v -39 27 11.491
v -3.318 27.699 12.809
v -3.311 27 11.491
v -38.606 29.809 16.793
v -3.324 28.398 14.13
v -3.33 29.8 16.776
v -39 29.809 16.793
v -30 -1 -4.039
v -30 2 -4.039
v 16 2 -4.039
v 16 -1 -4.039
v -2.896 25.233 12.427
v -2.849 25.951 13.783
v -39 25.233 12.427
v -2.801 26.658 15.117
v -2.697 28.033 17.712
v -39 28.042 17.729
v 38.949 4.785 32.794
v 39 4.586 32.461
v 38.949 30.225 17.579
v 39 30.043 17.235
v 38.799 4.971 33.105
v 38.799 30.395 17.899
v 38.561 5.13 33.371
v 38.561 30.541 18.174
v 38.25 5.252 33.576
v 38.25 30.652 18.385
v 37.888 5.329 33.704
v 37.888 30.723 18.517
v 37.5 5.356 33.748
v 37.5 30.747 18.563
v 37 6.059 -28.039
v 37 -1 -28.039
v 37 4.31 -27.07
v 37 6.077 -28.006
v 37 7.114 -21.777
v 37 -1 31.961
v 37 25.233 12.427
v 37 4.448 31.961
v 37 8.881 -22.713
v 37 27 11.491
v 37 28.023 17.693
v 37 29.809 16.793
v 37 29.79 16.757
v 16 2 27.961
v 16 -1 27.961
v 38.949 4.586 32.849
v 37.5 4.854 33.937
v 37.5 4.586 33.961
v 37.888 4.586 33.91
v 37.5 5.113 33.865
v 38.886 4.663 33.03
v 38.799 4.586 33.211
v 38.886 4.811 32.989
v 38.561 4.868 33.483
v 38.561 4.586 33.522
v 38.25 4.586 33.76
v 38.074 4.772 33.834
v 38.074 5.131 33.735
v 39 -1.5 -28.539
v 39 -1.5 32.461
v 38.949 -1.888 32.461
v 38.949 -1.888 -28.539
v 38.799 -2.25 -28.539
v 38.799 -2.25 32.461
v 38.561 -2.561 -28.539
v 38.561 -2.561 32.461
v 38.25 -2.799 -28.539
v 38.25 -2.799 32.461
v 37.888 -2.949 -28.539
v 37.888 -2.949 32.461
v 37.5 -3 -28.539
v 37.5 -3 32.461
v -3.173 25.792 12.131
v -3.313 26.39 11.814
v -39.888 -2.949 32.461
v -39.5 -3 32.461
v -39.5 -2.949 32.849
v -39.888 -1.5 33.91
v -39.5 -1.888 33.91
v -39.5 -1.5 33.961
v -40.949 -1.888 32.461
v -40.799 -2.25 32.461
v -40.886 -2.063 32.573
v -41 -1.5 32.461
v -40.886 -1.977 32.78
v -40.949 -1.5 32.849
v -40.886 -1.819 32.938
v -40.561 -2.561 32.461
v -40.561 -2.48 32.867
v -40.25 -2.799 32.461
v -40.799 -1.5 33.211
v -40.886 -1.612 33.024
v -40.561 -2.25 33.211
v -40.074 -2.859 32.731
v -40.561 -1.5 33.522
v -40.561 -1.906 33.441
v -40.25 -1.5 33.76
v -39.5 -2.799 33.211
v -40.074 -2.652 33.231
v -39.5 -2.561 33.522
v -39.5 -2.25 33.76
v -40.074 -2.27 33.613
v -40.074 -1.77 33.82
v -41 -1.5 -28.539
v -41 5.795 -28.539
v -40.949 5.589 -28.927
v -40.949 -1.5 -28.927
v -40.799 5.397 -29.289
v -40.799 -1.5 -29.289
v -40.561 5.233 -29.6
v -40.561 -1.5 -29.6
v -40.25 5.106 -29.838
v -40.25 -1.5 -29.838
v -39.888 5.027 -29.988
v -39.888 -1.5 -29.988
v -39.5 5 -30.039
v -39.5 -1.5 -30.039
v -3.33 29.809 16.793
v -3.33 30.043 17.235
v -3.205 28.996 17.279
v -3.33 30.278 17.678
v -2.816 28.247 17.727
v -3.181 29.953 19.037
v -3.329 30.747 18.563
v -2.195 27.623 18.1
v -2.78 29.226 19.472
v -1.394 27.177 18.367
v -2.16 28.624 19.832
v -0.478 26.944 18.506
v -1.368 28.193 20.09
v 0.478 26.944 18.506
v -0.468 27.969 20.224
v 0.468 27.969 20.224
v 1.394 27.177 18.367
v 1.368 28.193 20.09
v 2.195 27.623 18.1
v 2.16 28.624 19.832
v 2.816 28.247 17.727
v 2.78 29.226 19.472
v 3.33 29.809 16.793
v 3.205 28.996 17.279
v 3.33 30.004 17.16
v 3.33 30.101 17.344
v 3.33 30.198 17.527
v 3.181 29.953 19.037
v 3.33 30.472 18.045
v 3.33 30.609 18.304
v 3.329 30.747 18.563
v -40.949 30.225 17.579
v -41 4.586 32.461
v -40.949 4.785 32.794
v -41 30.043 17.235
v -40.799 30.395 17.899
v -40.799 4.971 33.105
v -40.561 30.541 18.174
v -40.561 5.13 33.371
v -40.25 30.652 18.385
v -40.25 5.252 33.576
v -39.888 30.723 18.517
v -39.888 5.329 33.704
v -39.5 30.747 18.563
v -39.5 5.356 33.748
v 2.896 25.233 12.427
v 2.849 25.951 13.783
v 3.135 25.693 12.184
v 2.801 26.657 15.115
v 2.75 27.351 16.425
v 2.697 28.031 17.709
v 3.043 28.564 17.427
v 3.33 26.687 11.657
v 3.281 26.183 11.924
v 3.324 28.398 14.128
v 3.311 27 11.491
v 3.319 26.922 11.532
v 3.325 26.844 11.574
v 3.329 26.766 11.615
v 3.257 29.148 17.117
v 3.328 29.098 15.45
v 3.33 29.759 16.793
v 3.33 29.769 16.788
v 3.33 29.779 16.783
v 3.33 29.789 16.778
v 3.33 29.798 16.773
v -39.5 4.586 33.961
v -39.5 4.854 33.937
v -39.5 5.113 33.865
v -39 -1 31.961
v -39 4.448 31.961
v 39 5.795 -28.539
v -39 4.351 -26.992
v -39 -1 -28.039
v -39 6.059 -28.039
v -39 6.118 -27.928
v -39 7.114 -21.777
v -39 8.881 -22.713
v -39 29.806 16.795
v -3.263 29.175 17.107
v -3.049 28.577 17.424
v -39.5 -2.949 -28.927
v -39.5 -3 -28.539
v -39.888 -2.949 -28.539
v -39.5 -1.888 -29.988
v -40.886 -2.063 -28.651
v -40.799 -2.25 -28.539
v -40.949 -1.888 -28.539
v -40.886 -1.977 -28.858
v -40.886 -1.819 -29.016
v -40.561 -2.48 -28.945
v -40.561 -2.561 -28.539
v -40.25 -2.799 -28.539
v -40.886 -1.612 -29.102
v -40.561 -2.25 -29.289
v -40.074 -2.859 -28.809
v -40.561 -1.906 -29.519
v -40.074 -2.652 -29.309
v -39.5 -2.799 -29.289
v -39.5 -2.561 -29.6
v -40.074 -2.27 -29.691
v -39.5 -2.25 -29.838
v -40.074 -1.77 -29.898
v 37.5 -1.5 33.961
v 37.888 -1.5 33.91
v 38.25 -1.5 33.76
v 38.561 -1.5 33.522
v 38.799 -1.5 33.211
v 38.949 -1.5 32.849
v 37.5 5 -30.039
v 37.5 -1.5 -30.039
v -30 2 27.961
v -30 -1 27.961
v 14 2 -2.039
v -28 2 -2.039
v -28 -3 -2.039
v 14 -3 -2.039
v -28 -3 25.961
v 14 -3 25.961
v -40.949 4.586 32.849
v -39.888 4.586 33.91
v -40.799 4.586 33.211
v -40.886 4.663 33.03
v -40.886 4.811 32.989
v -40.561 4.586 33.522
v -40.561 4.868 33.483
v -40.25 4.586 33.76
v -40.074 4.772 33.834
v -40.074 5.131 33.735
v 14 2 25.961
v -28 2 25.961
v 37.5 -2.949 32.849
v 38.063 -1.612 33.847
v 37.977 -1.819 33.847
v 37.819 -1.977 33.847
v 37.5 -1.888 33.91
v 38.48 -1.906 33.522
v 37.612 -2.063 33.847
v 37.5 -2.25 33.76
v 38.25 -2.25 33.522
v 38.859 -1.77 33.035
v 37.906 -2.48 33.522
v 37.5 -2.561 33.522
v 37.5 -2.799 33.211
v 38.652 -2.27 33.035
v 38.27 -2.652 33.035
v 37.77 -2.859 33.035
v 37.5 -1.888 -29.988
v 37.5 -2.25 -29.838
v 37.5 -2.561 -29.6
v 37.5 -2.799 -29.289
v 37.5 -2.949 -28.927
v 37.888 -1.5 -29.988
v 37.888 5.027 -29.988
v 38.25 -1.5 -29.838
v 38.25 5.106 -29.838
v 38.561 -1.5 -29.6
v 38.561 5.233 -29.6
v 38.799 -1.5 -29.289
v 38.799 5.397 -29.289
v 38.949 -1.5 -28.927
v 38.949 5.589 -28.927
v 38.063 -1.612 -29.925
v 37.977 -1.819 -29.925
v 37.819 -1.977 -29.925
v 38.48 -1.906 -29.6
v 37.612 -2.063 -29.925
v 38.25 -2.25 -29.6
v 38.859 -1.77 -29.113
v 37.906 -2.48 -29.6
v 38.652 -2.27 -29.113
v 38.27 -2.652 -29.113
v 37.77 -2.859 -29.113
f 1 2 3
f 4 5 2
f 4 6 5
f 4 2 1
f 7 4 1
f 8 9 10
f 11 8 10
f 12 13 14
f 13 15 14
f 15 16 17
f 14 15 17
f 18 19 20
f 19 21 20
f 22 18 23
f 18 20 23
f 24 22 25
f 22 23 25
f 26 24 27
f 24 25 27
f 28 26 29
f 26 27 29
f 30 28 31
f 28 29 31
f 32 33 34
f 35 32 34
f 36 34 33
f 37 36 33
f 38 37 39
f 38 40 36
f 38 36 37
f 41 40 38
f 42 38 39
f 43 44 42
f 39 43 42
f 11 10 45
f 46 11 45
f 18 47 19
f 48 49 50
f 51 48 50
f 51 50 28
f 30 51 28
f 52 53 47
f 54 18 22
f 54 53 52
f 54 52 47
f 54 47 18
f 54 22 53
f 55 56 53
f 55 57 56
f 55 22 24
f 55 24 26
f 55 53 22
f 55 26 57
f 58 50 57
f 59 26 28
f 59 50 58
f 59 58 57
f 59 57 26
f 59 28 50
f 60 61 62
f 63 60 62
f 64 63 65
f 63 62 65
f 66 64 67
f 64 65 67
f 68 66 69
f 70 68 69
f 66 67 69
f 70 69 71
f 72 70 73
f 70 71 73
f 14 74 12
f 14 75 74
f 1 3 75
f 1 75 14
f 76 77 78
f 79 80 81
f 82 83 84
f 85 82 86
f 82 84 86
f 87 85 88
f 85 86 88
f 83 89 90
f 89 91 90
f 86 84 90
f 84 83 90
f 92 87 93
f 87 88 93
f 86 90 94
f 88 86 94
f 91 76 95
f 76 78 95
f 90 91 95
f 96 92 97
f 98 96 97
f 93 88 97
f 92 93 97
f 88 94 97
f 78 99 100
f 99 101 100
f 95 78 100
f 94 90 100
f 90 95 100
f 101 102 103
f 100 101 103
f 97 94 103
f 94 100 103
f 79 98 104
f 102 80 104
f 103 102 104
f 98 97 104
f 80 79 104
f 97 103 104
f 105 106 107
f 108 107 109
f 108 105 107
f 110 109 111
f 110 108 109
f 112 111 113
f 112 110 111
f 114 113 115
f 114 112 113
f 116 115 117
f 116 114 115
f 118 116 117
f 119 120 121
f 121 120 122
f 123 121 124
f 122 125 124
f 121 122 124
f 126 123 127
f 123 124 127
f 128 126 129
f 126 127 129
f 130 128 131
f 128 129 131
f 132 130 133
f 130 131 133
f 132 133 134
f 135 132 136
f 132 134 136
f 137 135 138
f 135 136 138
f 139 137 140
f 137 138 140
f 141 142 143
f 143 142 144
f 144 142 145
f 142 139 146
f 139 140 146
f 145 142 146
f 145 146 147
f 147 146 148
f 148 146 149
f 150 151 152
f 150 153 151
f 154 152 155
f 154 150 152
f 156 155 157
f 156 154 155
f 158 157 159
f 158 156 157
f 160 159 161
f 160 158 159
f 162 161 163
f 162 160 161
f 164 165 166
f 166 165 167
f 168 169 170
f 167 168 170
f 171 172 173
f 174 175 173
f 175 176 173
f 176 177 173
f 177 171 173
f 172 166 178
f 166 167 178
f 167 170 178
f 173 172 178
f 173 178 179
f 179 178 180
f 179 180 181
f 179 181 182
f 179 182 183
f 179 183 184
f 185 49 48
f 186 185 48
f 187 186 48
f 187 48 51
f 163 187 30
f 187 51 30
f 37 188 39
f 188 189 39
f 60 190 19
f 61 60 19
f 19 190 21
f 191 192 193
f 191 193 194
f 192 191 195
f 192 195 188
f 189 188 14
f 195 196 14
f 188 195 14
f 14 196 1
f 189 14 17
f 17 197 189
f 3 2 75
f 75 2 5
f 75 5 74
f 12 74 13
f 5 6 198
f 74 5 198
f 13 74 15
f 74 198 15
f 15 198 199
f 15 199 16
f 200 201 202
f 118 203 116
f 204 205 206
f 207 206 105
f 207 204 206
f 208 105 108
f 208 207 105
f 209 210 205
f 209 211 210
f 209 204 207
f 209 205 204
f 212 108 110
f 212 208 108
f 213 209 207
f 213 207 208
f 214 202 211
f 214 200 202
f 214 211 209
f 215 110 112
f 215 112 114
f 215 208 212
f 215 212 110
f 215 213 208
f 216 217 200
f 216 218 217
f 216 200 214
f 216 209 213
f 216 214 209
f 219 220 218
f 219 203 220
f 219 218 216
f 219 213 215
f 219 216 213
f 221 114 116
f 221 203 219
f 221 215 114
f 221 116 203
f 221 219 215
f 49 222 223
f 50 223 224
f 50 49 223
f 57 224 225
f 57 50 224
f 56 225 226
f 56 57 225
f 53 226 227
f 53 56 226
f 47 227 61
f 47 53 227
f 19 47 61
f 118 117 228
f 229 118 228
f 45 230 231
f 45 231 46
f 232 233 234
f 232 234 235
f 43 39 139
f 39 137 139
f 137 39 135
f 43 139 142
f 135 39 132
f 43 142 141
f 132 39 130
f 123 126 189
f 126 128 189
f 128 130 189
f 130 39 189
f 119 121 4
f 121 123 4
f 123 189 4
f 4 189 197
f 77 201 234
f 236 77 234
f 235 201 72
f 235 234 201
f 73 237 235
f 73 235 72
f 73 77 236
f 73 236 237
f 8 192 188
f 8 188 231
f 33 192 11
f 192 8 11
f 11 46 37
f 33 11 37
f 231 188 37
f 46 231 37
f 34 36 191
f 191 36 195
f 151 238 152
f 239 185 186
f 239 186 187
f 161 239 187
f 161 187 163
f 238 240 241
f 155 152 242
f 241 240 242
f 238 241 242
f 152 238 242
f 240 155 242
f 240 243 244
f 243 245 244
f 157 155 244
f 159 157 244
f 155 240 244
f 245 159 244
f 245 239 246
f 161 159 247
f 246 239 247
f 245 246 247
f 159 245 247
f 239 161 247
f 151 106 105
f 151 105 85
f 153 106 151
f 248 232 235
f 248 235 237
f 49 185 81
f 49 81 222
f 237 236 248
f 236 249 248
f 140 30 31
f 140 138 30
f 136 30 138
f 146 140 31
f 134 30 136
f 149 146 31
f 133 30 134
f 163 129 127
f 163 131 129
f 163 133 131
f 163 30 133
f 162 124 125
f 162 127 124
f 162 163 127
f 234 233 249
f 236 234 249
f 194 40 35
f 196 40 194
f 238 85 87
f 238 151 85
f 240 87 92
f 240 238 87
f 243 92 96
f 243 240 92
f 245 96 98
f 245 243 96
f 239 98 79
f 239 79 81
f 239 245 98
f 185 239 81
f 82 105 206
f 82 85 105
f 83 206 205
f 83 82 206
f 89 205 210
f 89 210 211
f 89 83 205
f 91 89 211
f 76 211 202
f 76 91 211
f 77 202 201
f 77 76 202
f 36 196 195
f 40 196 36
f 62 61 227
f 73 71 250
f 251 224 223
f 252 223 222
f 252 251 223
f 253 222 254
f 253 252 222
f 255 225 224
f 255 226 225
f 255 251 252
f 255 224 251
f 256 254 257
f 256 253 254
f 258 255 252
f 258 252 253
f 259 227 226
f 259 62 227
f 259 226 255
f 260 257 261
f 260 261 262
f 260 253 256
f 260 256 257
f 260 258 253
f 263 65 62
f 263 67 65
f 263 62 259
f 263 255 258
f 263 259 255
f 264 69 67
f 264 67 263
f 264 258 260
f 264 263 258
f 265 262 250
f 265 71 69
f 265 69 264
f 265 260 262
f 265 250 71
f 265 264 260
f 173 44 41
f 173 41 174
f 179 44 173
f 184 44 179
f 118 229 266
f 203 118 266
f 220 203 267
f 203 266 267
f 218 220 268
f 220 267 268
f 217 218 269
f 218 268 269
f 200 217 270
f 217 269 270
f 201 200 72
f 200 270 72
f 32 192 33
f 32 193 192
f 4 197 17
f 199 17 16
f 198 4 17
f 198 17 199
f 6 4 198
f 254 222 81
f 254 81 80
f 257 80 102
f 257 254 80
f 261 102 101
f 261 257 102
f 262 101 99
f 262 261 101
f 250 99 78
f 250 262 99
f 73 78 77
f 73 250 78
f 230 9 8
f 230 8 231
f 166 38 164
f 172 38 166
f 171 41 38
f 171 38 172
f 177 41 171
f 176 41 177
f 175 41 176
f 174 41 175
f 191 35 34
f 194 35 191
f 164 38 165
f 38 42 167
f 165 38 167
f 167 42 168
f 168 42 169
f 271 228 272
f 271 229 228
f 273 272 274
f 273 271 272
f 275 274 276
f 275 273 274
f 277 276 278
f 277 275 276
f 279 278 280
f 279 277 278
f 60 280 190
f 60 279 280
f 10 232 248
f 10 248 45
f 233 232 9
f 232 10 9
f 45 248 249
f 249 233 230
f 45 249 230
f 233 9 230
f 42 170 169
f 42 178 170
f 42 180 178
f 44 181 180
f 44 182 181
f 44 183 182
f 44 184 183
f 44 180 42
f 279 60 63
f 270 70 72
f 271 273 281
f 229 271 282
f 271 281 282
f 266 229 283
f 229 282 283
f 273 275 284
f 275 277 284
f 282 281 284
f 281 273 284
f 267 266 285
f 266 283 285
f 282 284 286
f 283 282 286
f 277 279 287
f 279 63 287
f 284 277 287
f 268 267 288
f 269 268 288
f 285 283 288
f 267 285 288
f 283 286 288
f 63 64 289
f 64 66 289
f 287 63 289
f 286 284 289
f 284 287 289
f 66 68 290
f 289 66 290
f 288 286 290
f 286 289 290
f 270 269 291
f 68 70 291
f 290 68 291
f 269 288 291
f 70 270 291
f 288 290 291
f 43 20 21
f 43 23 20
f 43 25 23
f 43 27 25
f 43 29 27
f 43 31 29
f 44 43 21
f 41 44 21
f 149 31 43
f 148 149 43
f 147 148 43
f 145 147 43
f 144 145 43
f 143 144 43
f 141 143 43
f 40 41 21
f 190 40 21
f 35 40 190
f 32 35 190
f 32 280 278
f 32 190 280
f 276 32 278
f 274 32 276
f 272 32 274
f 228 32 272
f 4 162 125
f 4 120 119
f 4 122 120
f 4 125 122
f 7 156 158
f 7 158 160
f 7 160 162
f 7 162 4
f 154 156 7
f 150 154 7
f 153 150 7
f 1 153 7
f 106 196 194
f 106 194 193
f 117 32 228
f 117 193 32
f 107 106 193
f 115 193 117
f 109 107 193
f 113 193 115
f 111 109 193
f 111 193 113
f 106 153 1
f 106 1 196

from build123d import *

# Parameters (mm, degrees)
F0_W      = 80
F0_H      = 64
F0_W_2    = 42
F0_H_2    = 28
F1_DEPTH  = 3
F4_DEPTH  = 80
F5_T      = -2
F6_DEPTH  = 5
F7_R      = 1.5
F12_DEPTH = 2
F13_DEPTH = 2
F15_R     = 3.3298156999
F16_DEPTH = 25


# Not quite as in the source:
# - a feature names something its author has since deleted; it is built from what else it names


with BuildPart() as f1:
    # F0 (on Front) → F1 (new body)
    with BuildSketch(Plane.XZ):
        with Locations((-1, 1.9610269163)):
            Rectangle(F0_W, F0_H)
        with Locations((-7, 11.9610269163)):
            Rectangle(F0_W_2, F0_H_2, mode=Mode.SUBTRACT)
    extrude(amount=F1_DEPTH)

    # F3 (on offset) → F4 (join)
    with BuildSketch(Plane(origin=(-41, 0, 0), x_dir=(0, -1, 0), z_dir=(-1, 0, 0))):
        Polygon((0, -30.0389730837), (0, 33.9610269163), (-5, 33.9610269163), (-30.7466138076, 18.5625894163), (-5, -30.0389730837), align=None)
    extrude(amount=-F4_DEPTH)

    # F5
    f5_openings = [f1.faces().sort_by_distance(p)[0] for p in [
        (-1, 17.873307, -5.738192),
    ]]
    offset(amount=F5_T, openings=f5_openings, kind=Kind.INTERSECTION)

    # F0 (on Front) → F6 (cut)
    with BuildSketch(Plane.XZ):
        with Locations((-7, 11.9610269163)):
            Rectangle(F0_W_2, F0_H_2)
    extrude(amount=-F6_DEPTH, mode=Mode.SUBTRACT)

    # F7
    f7_edges = [f1.edges().sort_by_distance(p)[0] for p in [
        (39, -3, 1.961027),
        (39, 1, -30.038973),
        (-1, -3, -30.038973),
        (39, 1, 33.961027),
        (39, 17.873307, 26.261808),
        (-1, -3, 33.961027),
        (-1, 5, 33.961027),
        (-41, -3, 1.961027),
        (-41, 1, 33.961027),
        (-41, 17.873307, 26.261808),
        (-41, 1, -30.038973),
    ]]
    fillet(f7_edges, radius=F7_R)


with BuildPart() as f8_1:
    # F8: copy of F1
    add(f1.part)


with BuildPart() as f1_1:
    add(f1.part)

    # F11 (on offset) → F12 (join)
    with BuildSketch(Plane(origin=(0, 16.3302800697, -8.6509443873), x_dir=(-1, 0, 0), z_dir=(0, 0.8836647727, -0.468120251))):
        Polygon((-37, -15.9132964909), (-37, -21.9031590968), (39, -21.8151584268), (39, -15.9132964909), align=None)
    extrude(amount=-F12_DEPTH)

    # F11 (on offset) → F13 (join)
    with BuildSketch(Plane(origin=(0, 16.3302800697, -8.6509443873), x_dir=(-1, 0, 0), z_dir=(0, 0.8836647727, -0.468120251))):
        Polygon((39, 22.7937423885), (39, 28.7937423885), (-37, 28.7524405867), (-37, 22.7937423885), align=None)
    extrude(amount=-F13_DEPTH)

    # F15 (on offset) → F16 (cut)
    with BuildSketch(Plane(origin=(0, 16.2774082354, 27.2162772116), x_dir=(1, 0, 0), z_dir=(0, 0.51328125, 0.8582204603))):
        with Locations((0, 16.920266673)):
            Circle(F15_R)
    extrude(amount=-F16_DEPTH, mode=Mode.SUBTRACT)


solid = f1_1.part
